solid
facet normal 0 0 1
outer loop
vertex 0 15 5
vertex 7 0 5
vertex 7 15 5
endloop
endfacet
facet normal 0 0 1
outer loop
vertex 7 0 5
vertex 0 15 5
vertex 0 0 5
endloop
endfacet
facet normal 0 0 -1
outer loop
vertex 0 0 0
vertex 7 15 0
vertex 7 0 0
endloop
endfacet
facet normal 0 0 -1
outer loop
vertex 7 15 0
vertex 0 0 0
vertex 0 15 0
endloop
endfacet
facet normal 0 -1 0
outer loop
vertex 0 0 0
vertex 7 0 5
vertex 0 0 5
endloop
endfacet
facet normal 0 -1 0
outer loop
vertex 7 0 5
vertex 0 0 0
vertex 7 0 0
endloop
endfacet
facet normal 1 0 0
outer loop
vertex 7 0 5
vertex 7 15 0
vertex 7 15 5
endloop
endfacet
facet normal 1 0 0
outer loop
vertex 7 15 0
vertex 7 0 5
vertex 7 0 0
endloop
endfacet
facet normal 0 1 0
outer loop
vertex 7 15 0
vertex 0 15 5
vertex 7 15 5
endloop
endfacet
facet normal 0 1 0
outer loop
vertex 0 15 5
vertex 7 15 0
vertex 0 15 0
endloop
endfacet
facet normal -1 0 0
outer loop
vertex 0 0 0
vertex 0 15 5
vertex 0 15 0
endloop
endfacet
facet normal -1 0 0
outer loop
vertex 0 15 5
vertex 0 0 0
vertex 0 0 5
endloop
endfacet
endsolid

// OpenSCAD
// Generated by SolidPython 1.0.1 on 2020-07-29 00:46:55


cube(size = [7, 15, 5]);
/***********************************************
*********      SolidPython code:      **********
************************************************
 
# import packages: SolidPython
from solid import *
from solid.utils import *
from itertools import chain, combinations, permutations


class Resize:

    def __init__(self, scad_file):
        self.scad_file = scad_file
        #self.scad_file = import_scad(scad_file)
        # cone/cylinder param:
        self.r1 = 0
        self.r2 = 0
        self.h = 0
        # rectangular prism param:
        self.w = 0
        self.l = 0
        # ellipse param:
        self.r = 0

    # import OpenScad code (file name corresponds to shape)


    # classify shape + parameters
    def assign(self, param1, param2, param3):
        if self.scad_file == 'cone.scad':
            self.r1 = param1
            self.r2 = param2
            self.h = param3
        elif self.scad_file == 'cylinder.scad':
            self.r1 = param1
            self.r2 = param2
            self.h = param3
        elif self.scad_file == 'rectangularPrism.scad':
            self.h = param1
            self.l = param2
            self.w = param3
        else:
            self.r = param1
            self.h = param2

    # resize parameters
    def iterate(self):
        x = range(3, 20, 2)
        i = 1
        if self.scad_file == 'cone.scad':
            tempList = list(permutations(x, 2))
            for temp in tempList:
                param1 = temp[0]
                param2 = temp[1]
                filepath = 'produced_scad_files/' + 'cone' + str(param1) + '_' + str(param2) + '_' + '.scad'
                scad_render_to_file(cylinder(h=param1, r1=param2, r2=0), filepath)

        elif self.scad_file == 'cylinder.scad':
            tempList = list(permutations(x, 3))
            for temp in tempList:
                param1 = temp[0]
                param2 = temp[1]
                filepath = 'produced_scad_files/' + 'cylinder' + str(param1) + '_' + str(param2) + '_' + '.scad'
                scad_render_to_file(cylinder(h=param1, r1=param2, r2=param2), filepath)

        elif self.scad_file == 'rectangularPrism.scad':
            tempList = list(permutations(x, 3))
            for temp in tempList:
                param1 = temp[0]
                param2 = temp[1]
                param3 = temp[2]
                filepath = 'produced_scad_files/' + 'rectangularPrism' + str(param1) + '_' + str(param2) + '_' + str(
                    param3) + '.scad'
                scad_render_to_file(cube(size=(param1, param2, param3)), filepath)

        elif self.scad_file == 'ellipse.scad':
            tempList = list(permutations(x, 4))
            for temp in tempList:
                param1 = temp[0]
                param2 = temp[1]
                param3 = temp[2]
                param4 = temp[3]
                filepath = 'produced_scad_files/' + 'ellipse' + str(param1) + '_' + str(param2) + '_' + str(param3) + '_' + str(param4) + '.scad'
                scad_render_to_file(scale([param1, param2, param3])(sphere(r=param4)), filepath)

    def render_to_scadfile(self):
        scad_render_to_file(scad, 'example.scad') 
 
************************************************/
